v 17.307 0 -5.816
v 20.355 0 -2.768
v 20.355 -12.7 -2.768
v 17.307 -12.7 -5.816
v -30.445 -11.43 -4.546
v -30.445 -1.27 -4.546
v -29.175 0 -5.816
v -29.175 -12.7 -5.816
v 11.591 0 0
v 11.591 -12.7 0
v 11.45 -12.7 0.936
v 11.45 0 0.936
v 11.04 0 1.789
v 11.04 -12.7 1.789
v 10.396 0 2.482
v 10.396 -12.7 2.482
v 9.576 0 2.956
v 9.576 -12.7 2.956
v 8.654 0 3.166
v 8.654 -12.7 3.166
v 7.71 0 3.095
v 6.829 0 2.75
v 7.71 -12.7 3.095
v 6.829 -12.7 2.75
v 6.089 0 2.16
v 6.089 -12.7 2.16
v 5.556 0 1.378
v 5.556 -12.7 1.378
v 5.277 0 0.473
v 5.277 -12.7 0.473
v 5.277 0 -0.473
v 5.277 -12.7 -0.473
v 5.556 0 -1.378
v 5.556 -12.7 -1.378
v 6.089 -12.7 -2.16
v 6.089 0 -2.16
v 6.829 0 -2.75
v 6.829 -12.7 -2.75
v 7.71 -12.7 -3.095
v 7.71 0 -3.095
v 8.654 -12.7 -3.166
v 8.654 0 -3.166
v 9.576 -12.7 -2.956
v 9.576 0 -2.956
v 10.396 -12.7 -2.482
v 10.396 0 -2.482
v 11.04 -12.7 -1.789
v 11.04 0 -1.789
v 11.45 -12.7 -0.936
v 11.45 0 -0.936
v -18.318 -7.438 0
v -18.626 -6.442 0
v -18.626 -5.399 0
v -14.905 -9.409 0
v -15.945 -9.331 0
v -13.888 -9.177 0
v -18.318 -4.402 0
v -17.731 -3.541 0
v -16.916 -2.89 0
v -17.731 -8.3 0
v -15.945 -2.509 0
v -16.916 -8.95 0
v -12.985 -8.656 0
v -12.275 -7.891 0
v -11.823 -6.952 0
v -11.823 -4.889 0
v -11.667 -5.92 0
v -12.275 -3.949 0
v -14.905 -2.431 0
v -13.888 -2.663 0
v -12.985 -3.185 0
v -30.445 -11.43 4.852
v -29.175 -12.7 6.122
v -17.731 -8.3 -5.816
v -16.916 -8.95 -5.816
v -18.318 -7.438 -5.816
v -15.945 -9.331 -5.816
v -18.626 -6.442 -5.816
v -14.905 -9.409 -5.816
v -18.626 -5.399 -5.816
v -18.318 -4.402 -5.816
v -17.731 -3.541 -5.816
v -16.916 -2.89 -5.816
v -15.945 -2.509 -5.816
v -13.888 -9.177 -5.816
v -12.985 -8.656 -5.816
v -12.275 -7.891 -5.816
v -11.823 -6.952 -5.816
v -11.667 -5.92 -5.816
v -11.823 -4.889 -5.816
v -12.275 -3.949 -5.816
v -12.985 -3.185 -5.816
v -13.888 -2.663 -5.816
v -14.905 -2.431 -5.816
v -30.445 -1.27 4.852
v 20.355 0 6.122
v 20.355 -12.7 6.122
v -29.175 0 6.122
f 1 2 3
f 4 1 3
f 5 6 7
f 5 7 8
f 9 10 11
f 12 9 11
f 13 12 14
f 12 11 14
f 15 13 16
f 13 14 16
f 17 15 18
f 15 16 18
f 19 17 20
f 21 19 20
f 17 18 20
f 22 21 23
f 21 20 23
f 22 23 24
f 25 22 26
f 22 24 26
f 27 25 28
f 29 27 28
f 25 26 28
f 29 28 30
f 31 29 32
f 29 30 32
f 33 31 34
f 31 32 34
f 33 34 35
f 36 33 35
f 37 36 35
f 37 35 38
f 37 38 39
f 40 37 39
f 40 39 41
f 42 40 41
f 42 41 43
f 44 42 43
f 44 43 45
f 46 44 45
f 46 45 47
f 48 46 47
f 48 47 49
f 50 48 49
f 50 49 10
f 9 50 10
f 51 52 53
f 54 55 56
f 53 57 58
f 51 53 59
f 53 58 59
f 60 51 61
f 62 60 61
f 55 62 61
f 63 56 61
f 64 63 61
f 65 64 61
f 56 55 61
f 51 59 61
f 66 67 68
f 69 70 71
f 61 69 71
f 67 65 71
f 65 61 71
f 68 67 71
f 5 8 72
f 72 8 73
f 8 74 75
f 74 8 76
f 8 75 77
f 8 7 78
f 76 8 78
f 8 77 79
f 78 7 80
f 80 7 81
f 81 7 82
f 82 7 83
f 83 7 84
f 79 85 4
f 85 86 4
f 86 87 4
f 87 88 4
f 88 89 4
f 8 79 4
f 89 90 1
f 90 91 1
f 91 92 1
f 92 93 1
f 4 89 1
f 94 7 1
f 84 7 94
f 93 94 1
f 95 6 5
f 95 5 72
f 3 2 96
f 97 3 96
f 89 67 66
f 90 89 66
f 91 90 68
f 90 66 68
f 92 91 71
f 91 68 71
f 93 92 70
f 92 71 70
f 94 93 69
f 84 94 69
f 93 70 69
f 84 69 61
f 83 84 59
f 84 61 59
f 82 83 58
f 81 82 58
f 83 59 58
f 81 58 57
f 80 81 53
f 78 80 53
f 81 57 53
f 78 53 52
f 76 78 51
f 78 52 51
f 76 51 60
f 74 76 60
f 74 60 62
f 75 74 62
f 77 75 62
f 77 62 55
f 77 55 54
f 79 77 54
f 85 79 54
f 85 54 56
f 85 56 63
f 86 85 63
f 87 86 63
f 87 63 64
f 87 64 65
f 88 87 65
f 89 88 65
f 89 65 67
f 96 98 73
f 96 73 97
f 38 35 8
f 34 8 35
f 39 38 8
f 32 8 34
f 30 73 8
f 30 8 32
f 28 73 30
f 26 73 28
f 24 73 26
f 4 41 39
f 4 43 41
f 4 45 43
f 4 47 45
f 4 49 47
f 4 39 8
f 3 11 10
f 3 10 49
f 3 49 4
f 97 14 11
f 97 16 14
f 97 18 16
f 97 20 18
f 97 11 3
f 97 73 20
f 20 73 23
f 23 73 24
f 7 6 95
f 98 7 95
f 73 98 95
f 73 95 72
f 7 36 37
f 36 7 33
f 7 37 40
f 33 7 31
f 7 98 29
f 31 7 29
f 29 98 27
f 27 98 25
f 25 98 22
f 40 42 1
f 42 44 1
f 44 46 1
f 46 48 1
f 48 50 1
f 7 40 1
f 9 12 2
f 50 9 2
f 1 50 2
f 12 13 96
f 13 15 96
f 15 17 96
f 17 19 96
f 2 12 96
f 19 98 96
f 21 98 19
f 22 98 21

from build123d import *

# Parameters (mm, degrees)
F0_W     = 50.8
F0_H     = 11.938
F1_DEPTH = 12.7
F2_R     = 3.175
F3_DEPTH = 12.701
F5_DEPTH = 6.35
F6_SIZE  = 3.048
F7_SIZE  = 1.27


with BuildPart() as f1:
    # F0 (on Front) → F1 (new body)
    with BuildSketch(Plane.XZ):
        with Locations((-5.045198, 0.153461)):
            Rectangle(F0_W, F0_H)
    extrude(amount=F1_DEPTH)

    # F2 (on face) → F3 (cut, through all)
    with BuildSketch(Plane.XZ.offset(12.7)):
        with Locations((8.416499, 0)):
            Circle(F2_R)
    extrude(amount=-F3_DEPTH, mode=Mode.SUBTRACT)

    # F4 (on Top) → F5 (cut)
    with BuildSketch(Plane.XY):
        with BuildLine():
            ThreePointArc((-18.664943, -5.920342), (-15.166093, -9.419192), (-11.667243, -5.920342))
            ThreePointArc((-11.667243, -5.920342), (-15.166093, -2.421492), (-18.664943, -5.920342))
        make_face()
    extrude(amount=-F5_DEPTH, mode=Mode.SUBTRACT)

    # F6
    f6_edges = [f1.edges().sort_by_distance(p)[0] for p in [
        (20.354802, -6.35, -5.815539),
    ]]
    chamfer(f6_edges, length=F6_SIZE)

    # F7
    f7_edges = [f1.edges().sort_by_distance(p)[0] for p in [
        (-30.445198, -6.35, 6.122461),
        (-30.445198, -12.7, 0.153461),
        (-30.445198, -6.35, -5.815539),
        (-30.445198, 0, 0.153461),
    ]]
    chamfer(f7_edges, length=F7_SIZE)


solid = f1.part
